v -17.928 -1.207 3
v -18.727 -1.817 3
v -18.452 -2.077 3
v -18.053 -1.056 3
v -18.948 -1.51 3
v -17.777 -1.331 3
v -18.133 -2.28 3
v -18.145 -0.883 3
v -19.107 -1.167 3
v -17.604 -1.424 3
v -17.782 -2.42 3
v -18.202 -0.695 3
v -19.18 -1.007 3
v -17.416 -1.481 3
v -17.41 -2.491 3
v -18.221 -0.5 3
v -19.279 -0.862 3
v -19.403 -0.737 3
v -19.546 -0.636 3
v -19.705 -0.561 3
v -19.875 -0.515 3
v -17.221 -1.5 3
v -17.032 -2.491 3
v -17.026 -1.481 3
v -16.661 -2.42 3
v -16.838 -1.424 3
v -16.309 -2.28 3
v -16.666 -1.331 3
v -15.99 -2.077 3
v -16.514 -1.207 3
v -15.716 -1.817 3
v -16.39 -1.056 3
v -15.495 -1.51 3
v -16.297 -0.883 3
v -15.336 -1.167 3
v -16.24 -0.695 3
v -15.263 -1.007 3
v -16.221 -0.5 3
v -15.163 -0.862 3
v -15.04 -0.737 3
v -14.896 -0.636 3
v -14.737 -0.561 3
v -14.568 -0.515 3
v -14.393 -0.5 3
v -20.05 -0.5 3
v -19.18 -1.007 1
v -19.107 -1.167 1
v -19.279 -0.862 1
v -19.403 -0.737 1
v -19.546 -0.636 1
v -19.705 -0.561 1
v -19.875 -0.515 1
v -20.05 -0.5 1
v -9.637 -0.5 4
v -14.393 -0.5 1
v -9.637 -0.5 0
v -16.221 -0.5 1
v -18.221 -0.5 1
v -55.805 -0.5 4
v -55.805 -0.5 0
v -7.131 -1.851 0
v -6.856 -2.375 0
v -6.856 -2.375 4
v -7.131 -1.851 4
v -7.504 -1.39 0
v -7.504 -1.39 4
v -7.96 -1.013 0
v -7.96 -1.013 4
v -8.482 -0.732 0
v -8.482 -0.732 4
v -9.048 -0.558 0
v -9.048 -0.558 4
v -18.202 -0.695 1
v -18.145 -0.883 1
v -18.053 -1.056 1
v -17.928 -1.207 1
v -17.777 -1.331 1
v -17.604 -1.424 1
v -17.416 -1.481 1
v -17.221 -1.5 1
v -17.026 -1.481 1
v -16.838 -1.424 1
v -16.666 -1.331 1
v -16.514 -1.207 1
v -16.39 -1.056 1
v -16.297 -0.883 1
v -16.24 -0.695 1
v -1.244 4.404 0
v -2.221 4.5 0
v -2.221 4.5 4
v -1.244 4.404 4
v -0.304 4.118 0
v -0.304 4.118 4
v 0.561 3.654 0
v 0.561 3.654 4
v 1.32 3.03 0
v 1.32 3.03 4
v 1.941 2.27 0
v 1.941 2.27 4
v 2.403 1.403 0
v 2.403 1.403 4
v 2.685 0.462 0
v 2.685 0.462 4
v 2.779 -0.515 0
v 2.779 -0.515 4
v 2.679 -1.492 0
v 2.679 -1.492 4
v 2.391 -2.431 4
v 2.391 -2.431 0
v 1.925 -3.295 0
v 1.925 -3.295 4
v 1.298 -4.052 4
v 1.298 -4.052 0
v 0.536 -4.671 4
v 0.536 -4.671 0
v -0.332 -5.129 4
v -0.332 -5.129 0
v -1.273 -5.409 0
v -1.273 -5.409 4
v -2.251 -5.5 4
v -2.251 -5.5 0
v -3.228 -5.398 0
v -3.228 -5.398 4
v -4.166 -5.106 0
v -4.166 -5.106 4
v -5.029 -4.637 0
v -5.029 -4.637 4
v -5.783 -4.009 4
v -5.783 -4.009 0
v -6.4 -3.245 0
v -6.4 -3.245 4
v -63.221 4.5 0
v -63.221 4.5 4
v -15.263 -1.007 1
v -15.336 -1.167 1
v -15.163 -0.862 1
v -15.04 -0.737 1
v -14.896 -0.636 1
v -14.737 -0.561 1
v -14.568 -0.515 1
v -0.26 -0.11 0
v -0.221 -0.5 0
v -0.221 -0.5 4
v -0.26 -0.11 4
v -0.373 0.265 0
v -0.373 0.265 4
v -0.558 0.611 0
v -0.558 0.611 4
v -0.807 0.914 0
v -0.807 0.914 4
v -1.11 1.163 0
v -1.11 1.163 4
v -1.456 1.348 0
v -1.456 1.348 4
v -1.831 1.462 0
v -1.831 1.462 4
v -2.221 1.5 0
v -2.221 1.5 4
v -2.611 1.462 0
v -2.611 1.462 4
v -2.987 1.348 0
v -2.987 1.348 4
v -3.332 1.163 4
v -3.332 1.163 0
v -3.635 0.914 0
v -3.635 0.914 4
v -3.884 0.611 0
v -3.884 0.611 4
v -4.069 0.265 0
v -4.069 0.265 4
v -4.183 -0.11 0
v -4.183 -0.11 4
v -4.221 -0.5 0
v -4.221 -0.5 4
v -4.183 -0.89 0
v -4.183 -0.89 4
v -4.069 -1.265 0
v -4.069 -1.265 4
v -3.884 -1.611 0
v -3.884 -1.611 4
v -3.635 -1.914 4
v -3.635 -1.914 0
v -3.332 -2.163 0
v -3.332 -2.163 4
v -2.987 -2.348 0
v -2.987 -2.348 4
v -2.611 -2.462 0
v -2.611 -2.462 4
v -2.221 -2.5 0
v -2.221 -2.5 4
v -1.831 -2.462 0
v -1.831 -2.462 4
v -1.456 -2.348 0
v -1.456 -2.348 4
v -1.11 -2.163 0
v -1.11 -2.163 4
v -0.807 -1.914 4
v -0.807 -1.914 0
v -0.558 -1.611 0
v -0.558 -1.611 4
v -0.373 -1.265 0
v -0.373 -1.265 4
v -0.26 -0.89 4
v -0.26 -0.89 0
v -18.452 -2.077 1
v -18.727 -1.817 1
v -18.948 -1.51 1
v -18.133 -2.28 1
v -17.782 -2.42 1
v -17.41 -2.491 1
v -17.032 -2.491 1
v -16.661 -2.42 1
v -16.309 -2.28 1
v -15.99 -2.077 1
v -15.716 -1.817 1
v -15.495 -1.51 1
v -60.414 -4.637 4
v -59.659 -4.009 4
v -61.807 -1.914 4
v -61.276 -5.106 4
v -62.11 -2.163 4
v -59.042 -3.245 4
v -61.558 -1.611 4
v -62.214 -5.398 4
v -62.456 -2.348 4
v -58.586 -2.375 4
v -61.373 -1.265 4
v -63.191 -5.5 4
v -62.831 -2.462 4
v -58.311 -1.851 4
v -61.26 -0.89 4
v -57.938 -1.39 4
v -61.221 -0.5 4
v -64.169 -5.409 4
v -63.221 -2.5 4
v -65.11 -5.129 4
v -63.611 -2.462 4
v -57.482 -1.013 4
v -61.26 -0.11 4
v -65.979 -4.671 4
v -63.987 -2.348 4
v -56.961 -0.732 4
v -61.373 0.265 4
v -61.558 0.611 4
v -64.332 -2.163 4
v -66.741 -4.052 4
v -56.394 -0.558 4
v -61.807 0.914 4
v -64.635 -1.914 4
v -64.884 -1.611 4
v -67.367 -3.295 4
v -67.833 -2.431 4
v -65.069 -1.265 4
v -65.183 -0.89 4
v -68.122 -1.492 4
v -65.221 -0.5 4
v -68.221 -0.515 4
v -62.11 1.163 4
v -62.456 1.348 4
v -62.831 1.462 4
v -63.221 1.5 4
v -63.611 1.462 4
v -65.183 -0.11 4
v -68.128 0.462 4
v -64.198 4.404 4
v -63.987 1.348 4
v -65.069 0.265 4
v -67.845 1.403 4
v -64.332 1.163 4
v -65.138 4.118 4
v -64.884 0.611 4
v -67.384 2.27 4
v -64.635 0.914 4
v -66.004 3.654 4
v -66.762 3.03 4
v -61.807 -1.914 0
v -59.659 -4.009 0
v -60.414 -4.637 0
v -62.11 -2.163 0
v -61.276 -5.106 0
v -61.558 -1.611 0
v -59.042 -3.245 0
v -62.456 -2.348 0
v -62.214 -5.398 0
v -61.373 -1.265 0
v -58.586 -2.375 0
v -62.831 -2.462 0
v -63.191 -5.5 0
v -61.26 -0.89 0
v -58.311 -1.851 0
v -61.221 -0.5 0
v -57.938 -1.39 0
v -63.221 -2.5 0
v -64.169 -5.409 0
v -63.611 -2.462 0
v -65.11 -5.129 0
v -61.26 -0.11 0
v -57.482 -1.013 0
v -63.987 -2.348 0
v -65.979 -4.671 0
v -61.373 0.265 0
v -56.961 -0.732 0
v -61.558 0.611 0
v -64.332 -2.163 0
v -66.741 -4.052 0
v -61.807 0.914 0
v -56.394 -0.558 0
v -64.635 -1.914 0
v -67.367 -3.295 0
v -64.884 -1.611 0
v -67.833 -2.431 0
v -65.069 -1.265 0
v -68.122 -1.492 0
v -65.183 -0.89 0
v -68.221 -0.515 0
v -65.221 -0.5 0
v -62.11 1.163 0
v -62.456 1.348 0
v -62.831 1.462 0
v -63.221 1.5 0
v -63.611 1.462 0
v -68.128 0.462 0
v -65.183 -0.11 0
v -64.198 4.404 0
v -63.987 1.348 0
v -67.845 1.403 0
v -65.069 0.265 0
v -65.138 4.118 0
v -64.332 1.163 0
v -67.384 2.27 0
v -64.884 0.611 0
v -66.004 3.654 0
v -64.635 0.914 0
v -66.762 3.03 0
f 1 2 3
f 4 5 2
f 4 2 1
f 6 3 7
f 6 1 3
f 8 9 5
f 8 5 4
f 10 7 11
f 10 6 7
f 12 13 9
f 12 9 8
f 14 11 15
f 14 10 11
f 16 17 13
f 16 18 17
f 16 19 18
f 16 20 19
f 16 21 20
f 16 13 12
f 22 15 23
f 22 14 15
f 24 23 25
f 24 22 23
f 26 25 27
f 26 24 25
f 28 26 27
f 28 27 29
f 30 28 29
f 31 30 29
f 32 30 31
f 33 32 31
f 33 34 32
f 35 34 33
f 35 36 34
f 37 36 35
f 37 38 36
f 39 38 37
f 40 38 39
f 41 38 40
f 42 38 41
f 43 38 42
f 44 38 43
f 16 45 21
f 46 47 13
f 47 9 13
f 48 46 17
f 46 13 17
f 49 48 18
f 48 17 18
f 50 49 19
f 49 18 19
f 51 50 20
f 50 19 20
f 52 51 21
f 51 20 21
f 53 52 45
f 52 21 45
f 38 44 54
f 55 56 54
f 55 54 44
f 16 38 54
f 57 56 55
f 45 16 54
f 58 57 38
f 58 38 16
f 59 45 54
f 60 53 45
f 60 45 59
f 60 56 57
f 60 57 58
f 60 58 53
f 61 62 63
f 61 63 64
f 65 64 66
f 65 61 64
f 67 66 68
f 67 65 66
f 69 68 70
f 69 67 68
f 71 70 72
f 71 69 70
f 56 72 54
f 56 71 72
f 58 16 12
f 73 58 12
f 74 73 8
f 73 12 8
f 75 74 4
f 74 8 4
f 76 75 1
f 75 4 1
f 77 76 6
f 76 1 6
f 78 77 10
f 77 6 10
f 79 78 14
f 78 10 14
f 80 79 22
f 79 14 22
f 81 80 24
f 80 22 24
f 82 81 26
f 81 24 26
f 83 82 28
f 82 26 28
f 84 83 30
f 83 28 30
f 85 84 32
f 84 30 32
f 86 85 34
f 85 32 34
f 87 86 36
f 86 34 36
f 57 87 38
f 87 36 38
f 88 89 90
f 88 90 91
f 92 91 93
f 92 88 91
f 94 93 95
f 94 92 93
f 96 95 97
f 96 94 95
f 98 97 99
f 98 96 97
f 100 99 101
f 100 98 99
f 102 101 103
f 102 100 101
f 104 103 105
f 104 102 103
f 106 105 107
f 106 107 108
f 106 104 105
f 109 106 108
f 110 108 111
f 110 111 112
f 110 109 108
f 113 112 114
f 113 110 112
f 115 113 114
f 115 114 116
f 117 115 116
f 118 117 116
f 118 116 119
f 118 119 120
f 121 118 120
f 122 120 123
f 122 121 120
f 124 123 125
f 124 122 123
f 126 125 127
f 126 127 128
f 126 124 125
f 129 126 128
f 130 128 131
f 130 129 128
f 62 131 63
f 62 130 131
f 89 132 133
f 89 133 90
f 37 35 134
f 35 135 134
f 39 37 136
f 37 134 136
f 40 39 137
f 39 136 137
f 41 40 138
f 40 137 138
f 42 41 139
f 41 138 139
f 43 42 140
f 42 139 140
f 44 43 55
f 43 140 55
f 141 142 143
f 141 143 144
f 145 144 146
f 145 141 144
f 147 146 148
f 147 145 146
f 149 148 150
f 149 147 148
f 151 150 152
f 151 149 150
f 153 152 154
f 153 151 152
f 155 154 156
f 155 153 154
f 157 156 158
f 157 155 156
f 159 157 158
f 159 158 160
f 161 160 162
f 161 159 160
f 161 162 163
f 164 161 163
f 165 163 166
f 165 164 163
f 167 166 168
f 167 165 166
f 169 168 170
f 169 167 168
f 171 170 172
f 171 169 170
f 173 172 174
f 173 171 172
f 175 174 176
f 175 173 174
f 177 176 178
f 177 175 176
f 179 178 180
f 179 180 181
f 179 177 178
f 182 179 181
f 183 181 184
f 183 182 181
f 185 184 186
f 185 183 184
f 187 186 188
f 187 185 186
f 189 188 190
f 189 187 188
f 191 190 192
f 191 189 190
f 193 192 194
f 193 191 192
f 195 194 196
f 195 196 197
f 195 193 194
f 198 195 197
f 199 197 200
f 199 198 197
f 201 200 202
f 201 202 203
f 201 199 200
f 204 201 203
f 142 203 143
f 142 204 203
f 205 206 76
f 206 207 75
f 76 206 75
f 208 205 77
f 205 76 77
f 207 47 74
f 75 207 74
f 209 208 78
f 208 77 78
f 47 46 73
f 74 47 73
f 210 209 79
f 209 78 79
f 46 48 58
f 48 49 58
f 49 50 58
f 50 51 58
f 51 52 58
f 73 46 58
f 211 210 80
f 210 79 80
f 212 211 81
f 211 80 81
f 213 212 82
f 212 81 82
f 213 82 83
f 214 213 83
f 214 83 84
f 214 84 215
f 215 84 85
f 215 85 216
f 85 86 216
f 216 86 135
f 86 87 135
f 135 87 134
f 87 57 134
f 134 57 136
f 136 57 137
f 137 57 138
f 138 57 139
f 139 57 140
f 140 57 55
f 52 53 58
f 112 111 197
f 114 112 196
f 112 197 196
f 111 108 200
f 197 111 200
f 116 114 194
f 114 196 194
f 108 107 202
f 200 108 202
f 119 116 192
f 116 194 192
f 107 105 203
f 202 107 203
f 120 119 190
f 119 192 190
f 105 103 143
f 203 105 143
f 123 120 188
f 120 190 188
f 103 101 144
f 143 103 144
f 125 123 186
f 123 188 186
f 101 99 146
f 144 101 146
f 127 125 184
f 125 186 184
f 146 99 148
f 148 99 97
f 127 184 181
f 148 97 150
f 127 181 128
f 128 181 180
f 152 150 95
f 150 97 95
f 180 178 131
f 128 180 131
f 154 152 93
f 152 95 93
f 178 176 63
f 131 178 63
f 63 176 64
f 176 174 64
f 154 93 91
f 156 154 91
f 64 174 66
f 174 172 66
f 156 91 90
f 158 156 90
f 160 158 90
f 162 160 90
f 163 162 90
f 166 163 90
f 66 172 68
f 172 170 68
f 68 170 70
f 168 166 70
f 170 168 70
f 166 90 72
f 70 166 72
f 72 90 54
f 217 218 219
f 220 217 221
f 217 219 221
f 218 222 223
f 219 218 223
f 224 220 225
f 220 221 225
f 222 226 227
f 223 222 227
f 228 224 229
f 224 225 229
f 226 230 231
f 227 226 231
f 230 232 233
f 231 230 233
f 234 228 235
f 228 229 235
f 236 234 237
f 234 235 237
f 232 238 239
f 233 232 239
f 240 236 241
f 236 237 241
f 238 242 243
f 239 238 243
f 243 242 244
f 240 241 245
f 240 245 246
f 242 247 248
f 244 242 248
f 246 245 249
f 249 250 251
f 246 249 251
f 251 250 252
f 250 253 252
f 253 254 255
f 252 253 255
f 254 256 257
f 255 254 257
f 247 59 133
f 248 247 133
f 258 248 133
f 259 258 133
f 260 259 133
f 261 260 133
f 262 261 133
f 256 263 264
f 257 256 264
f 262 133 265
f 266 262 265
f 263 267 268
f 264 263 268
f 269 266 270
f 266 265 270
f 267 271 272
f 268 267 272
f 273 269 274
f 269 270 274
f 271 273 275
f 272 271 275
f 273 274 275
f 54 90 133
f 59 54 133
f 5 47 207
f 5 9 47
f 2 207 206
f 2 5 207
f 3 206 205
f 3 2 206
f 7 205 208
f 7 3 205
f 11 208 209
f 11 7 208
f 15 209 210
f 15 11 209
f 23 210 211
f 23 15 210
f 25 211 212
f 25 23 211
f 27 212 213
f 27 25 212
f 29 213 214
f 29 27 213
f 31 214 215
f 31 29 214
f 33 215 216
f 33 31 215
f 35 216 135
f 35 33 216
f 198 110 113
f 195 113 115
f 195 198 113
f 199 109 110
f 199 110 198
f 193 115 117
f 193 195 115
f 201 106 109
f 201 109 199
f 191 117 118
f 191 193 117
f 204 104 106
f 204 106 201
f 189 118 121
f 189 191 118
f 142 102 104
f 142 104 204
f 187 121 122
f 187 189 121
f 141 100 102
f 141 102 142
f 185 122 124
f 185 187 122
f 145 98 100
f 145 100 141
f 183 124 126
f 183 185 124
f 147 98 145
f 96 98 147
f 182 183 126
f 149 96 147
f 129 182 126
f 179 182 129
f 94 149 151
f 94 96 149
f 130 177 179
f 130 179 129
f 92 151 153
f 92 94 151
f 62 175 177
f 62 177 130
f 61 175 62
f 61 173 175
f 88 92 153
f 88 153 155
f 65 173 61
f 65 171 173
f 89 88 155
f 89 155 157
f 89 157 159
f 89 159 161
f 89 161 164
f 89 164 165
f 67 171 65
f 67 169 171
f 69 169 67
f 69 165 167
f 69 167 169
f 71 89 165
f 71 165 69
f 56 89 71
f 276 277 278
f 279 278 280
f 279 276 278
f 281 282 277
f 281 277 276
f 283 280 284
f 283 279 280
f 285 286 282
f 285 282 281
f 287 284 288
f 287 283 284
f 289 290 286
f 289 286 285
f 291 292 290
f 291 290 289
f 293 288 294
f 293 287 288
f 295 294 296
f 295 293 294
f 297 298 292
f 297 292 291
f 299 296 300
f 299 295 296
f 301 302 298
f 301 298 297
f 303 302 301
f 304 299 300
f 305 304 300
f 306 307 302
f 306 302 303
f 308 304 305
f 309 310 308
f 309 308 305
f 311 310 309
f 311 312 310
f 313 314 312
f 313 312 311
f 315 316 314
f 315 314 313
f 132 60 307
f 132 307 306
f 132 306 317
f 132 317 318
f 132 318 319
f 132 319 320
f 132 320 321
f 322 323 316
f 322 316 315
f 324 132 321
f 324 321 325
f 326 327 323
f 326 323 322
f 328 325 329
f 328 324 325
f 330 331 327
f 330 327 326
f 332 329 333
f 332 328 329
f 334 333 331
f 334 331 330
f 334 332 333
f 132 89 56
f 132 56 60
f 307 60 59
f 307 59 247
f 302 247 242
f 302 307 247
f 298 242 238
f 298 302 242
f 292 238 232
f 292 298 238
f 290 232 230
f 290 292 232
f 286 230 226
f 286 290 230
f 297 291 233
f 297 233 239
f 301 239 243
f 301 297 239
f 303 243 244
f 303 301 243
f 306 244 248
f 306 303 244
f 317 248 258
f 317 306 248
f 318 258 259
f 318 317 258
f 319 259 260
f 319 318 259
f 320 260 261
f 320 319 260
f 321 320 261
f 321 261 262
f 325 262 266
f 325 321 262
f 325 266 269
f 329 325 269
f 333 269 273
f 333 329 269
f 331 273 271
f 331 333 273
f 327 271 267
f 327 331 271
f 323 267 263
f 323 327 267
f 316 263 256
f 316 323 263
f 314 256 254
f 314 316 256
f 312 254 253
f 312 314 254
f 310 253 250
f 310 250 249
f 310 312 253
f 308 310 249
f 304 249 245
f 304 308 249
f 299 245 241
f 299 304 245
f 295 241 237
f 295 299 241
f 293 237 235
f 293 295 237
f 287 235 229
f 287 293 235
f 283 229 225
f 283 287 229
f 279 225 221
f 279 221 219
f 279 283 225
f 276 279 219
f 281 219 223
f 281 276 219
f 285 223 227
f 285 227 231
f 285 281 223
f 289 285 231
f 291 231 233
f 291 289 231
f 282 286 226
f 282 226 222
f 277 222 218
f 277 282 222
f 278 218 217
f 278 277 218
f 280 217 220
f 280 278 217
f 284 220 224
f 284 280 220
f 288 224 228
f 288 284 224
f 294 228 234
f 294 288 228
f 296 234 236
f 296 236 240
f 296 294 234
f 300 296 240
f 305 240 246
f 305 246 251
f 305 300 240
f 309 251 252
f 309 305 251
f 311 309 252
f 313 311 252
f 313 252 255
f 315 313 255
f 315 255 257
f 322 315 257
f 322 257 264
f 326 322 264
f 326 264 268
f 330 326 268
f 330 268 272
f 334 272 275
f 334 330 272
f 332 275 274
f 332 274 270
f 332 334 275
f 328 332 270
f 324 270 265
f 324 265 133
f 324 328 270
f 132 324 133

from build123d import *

# Parameters (mm, degrees)
SKETCH1_R           = 2
BOSS_EXTRUDE1_DEPTH = 4
BOSS_EXTRUDE3_START = -1
SKETCH3_R           = 2
SKETCH3_R_2         = 1
BOSS_EXTRUDE3_DEPTH = 2
FILLET1_R           = 1


with BuildPart() as part:
    # Sketch1 → Boss-Extrude1 (new body)
    with BuildSketch(Plane.XY):
        with BuildLine():
            Line((-63.221147144, 4.5), (-2.221147144, 4.5))
            ThreePointArc((-2.221147144, 4.5), (1.924633844, -3.295084972), (-6.856271198, -2.375))
            ThreePointArc((-6.856271198, -2.375), (-7.960294648, -1.012531407), (-9.637345631, -0.5))
            Line((-9.637345631, -0.5), (-55.804948657, -0.5))
            ThreePointArc((-55.804948657, -0.5), (-57.48199964, -1.012531407), (-58.586023089, -2.375))
            ThreePointArc((-58.586023089, -2.375), (-67.366928132, -3.295084972), (-63.221147144, 4.5))
        make_face()
        with Locations((-63.221147144, -0.5)):
            Circle(SKETCH1_R, mode=Mode.SUBTRACT)
        with Locations((-2.221147144, -0.5)):
            Circle(SKETCH1_R, mode=Mode.SUBTRACT)
    extrude(amount=BOSS_EXTRUDE1_DEPTH)

    # Sketch3 → Boss-Extrude3 (add)
    with BuildSketch(Plane.XY.offset(4).offset(BOSS_EXTRUDE3_START)):
        with Locations((-17.221147144, -0.5)):
            Circle(SKETCH3_R)
        with Locations((-17.221147144, -0.5)):
            Circle(SKETCH3_R_2, mode=Mode.SUBTRACT)
    extrude(amount=-BOSS_EXTRUDE3_DEPTH)

    # Fillet1
    fillet1_edges = [part.edges().sort_by_distance(p)[0] for p in [
        (-15.221147144, -0.5, 2),
        (-19.221147144, -0.5, 2),
    ]]
    fillet(fillet1_edges, radius=FILLET1_R)


solid = part.part
